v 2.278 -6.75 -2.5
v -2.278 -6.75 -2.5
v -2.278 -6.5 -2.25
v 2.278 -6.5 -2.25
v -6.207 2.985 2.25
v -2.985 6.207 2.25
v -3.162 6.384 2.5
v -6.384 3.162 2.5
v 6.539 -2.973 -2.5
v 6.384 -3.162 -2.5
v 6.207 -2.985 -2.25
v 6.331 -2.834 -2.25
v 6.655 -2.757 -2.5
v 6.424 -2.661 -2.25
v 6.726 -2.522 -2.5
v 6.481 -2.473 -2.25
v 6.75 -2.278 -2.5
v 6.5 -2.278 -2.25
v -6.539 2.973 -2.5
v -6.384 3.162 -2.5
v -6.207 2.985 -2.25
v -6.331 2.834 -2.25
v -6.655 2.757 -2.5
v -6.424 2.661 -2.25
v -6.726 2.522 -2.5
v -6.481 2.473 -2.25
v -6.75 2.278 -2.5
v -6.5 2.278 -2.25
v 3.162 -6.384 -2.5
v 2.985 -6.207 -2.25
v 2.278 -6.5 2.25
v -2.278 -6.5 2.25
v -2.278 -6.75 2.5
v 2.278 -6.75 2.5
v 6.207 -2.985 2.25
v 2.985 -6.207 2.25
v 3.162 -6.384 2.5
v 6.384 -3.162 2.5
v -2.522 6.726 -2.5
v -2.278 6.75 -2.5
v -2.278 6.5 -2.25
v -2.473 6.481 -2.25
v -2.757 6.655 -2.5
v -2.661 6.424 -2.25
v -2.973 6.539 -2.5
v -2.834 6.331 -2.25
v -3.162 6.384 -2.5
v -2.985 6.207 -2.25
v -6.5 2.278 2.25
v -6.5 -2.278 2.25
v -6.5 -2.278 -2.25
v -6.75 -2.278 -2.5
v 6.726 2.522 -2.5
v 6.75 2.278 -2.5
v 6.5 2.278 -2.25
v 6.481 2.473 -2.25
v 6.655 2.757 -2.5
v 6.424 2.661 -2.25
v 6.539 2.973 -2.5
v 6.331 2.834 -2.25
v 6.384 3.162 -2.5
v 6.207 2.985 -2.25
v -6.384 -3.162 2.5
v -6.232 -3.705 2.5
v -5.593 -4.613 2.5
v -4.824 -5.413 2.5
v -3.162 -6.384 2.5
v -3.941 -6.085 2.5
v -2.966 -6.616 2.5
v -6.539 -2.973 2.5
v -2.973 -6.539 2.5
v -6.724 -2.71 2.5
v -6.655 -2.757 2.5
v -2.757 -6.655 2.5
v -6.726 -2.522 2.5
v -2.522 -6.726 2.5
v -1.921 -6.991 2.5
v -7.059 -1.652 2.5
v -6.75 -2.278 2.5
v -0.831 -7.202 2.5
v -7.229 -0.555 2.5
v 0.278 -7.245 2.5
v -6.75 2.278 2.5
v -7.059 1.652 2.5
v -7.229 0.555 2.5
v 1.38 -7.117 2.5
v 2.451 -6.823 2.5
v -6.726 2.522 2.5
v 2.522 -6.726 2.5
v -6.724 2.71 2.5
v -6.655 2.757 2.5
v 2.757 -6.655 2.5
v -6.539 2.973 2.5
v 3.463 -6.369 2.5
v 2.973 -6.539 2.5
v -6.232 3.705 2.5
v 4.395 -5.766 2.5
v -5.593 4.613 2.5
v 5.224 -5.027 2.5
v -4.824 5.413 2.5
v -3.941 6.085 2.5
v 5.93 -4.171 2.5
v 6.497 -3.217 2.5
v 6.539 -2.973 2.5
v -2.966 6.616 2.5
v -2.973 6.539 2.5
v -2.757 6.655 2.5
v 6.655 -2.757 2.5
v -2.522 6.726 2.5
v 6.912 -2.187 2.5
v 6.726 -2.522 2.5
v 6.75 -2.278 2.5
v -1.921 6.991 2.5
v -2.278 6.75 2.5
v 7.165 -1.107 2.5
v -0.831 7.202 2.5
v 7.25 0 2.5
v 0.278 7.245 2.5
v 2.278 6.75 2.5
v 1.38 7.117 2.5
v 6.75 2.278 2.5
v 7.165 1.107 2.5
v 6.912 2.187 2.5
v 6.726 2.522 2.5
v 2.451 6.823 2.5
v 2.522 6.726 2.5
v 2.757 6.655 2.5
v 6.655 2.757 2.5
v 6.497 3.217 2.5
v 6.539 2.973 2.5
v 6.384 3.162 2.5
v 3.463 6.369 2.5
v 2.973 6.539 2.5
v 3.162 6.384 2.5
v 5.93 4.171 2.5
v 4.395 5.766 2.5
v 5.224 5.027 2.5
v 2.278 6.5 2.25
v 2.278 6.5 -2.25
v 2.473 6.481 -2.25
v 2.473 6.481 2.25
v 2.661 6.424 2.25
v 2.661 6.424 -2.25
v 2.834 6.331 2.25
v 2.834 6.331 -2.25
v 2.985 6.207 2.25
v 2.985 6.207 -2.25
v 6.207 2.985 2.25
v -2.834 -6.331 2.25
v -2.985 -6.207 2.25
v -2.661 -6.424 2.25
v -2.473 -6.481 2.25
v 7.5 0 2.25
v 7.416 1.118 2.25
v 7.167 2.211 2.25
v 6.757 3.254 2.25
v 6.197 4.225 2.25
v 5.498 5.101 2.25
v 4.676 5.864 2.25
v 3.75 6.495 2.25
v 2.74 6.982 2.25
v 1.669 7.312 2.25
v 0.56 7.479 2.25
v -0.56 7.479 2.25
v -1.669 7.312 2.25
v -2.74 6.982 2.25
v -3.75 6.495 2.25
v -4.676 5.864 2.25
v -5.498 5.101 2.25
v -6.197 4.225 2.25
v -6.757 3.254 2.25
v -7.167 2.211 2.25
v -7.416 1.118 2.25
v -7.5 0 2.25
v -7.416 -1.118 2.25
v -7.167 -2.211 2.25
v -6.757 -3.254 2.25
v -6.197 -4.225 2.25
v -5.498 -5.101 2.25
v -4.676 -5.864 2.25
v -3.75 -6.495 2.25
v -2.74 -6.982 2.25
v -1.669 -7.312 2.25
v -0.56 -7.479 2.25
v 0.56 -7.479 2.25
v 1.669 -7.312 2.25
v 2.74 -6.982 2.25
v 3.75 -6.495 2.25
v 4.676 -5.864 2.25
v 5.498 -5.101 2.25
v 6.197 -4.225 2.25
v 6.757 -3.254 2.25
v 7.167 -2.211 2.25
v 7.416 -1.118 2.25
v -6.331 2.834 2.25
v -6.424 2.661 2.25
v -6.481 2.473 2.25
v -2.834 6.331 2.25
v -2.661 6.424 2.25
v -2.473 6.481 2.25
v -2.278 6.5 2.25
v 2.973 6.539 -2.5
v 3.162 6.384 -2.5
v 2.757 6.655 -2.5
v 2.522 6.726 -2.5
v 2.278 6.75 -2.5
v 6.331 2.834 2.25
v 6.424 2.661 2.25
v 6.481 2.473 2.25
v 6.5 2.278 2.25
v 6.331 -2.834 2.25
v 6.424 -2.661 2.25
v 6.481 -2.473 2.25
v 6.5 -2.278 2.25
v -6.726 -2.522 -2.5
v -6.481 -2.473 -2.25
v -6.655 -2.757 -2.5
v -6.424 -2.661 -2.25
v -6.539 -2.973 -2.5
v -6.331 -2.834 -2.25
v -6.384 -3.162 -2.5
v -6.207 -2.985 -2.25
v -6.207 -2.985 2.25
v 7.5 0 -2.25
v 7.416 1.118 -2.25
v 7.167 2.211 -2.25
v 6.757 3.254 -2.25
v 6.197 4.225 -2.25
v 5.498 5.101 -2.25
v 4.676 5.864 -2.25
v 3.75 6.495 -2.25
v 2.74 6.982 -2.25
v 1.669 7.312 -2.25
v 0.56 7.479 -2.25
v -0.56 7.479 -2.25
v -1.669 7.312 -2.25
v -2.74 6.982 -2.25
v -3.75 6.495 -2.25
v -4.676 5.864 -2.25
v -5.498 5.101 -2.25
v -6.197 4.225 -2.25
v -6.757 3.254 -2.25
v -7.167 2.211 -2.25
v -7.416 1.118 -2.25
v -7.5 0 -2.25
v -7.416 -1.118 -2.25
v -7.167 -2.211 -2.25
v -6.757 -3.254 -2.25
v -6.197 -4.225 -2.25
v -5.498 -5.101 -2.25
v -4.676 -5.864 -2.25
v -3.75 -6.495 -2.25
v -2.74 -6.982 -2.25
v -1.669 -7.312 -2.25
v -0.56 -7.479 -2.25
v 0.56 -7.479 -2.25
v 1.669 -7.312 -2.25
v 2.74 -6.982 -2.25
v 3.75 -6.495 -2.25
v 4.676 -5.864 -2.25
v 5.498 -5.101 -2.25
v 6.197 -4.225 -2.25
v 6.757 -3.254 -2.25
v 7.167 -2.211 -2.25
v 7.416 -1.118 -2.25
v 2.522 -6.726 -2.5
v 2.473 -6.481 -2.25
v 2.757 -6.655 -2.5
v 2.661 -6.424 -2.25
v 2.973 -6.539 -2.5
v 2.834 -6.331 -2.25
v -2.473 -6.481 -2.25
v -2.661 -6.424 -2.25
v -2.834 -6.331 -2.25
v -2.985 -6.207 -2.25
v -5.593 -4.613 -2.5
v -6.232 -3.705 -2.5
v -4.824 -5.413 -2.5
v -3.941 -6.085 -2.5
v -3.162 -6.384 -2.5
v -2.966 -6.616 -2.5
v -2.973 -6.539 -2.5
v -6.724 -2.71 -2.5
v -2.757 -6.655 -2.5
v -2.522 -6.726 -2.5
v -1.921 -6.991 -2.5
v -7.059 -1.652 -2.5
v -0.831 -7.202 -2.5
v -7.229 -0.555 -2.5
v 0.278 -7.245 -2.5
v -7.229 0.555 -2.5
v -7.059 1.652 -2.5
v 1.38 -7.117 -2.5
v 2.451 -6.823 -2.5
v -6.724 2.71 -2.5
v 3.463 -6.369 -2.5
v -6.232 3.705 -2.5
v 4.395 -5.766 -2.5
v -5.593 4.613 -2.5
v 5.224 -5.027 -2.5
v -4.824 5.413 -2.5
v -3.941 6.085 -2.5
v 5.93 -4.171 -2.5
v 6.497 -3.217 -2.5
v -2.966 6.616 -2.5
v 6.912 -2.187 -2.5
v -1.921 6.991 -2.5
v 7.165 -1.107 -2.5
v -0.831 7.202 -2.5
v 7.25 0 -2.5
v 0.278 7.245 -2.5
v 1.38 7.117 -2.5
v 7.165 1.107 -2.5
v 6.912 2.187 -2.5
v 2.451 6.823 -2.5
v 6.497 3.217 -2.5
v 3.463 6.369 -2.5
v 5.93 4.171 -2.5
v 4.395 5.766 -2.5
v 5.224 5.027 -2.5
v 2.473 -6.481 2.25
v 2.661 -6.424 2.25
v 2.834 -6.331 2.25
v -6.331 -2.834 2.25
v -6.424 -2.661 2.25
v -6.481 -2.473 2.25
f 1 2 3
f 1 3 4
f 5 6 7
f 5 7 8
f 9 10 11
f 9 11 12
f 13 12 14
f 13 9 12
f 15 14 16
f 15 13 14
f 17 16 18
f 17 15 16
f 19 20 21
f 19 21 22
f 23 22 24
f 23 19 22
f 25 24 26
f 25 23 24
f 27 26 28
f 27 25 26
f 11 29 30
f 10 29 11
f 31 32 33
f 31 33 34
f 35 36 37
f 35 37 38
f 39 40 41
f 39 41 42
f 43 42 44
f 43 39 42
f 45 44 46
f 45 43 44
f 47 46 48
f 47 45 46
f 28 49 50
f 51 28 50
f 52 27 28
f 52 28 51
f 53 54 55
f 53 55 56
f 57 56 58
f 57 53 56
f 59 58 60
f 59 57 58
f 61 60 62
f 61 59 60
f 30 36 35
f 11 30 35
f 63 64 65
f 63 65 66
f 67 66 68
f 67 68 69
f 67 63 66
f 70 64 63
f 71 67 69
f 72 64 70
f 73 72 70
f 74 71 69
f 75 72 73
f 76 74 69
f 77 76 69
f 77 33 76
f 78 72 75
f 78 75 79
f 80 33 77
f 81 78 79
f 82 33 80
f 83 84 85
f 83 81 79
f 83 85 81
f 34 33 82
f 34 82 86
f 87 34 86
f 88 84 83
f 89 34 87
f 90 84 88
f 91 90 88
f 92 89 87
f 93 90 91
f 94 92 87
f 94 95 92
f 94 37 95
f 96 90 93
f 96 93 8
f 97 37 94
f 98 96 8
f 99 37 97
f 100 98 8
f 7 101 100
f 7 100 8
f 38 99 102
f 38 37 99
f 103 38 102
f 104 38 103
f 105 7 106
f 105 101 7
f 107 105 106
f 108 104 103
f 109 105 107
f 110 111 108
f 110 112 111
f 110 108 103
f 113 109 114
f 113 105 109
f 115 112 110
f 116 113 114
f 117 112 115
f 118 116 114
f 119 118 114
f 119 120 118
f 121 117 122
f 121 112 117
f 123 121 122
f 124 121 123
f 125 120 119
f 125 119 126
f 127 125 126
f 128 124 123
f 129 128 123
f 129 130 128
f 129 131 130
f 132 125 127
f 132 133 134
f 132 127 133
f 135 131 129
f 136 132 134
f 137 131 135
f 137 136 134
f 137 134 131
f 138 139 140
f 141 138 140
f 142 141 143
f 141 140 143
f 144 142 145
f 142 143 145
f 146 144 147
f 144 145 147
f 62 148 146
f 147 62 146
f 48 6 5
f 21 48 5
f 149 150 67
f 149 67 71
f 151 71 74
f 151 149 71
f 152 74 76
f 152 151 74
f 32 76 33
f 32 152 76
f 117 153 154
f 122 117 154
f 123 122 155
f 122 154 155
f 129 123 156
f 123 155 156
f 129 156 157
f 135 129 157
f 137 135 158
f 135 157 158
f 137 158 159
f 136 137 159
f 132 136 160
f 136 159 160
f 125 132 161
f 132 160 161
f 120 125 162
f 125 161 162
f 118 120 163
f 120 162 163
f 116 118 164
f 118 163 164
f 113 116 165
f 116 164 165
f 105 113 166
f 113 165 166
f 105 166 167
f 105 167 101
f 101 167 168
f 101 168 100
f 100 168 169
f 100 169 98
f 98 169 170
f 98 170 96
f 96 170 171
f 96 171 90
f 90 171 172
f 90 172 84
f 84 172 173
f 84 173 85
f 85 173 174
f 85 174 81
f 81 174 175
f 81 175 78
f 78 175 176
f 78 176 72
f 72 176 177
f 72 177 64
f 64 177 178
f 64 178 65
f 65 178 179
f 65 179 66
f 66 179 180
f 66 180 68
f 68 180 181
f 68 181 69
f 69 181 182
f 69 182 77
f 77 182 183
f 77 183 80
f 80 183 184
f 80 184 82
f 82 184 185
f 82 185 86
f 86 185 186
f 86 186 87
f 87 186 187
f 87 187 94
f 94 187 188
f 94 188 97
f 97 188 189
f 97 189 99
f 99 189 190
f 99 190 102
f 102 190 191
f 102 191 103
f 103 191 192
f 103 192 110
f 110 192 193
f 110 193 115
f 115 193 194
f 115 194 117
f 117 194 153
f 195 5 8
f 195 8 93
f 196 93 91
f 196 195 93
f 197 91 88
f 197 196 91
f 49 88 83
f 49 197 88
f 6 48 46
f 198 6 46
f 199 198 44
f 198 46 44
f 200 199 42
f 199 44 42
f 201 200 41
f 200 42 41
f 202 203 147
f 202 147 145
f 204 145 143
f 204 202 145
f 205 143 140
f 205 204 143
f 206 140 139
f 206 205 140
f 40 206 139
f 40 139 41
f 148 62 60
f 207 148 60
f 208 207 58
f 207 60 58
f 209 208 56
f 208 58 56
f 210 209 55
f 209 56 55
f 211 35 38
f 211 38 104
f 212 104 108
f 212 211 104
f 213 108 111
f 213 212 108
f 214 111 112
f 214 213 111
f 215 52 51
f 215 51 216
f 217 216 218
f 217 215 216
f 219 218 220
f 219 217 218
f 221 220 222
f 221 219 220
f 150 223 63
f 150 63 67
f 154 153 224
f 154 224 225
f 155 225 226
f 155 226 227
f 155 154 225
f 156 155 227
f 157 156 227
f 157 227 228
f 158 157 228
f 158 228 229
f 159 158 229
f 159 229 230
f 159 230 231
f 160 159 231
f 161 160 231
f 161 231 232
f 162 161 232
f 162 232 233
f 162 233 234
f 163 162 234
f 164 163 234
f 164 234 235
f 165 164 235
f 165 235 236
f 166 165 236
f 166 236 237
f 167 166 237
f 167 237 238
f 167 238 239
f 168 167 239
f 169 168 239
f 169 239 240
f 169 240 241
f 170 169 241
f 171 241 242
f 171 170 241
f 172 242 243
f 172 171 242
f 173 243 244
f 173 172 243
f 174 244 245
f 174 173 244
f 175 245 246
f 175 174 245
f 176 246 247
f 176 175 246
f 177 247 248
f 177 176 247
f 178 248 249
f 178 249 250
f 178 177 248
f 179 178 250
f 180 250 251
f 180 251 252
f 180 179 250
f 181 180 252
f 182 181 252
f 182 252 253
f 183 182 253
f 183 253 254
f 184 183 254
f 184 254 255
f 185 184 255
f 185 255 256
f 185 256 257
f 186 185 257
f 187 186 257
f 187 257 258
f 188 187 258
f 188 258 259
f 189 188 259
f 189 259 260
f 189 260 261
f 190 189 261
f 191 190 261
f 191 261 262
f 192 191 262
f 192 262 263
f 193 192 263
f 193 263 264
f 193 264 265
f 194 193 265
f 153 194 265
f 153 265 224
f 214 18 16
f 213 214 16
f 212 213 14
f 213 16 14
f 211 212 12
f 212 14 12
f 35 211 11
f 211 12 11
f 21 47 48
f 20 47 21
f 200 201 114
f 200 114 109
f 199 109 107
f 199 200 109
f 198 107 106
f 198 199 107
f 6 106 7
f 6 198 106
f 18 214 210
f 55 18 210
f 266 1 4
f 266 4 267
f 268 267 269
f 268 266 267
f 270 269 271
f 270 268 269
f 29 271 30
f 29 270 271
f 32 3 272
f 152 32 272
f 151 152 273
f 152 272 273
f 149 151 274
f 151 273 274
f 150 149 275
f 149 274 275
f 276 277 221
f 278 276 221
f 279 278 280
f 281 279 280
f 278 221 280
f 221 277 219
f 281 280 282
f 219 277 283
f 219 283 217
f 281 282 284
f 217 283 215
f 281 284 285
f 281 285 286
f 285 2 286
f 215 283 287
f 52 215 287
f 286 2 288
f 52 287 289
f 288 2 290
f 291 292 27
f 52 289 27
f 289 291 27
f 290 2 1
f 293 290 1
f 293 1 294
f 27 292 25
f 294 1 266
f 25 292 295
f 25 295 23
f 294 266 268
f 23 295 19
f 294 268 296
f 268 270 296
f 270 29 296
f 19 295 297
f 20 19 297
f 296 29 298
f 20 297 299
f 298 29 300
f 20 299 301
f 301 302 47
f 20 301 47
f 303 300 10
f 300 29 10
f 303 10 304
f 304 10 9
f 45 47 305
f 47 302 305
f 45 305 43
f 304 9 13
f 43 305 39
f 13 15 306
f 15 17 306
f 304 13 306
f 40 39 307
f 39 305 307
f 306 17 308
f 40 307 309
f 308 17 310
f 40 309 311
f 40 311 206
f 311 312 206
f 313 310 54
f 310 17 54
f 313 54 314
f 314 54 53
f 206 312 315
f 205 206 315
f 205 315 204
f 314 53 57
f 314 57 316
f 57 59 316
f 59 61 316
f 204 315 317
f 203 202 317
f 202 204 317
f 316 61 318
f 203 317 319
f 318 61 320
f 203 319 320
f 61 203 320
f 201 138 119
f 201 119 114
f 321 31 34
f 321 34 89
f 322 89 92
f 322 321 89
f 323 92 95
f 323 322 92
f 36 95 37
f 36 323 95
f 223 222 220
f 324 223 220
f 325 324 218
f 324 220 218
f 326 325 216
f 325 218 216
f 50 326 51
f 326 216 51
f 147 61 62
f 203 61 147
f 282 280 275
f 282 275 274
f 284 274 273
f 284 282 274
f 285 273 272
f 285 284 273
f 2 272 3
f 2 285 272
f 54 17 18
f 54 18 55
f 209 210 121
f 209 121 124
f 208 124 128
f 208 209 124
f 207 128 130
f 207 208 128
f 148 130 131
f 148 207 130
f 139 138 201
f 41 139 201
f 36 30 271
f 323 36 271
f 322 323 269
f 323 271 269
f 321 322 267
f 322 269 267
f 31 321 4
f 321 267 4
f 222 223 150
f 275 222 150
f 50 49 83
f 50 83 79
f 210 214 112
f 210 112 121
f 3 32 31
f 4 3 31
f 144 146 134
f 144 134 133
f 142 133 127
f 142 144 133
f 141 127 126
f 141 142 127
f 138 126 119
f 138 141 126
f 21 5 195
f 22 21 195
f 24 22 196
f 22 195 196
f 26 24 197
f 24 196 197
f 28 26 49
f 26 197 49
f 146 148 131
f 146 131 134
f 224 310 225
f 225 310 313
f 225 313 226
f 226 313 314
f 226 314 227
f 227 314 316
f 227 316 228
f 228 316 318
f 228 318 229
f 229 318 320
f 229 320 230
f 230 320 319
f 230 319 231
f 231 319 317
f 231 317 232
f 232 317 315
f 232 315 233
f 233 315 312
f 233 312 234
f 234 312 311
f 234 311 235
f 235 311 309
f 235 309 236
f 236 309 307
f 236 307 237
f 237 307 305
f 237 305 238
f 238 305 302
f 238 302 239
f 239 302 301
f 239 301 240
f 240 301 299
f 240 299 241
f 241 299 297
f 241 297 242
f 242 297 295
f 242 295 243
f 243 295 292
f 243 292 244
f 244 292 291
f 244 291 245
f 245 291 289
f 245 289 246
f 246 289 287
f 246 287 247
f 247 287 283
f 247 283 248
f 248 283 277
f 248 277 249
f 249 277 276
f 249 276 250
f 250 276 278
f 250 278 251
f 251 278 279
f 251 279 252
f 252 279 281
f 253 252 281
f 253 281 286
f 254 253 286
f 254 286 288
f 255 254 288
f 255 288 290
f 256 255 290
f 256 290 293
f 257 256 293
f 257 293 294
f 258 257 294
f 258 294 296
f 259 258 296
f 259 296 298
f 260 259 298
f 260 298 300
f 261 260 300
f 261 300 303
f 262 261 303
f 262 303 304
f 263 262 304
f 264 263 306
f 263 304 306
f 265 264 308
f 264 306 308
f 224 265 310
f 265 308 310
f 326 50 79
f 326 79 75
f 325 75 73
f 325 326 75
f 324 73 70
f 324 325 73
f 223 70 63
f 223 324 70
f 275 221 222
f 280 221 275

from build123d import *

# Parameters (mm, degrees)
SKETCH1_R           = 7.5
BOSS_EXTRUDE1_DEPTH = 2.5
FILLET1_R           = 1
CHAMFER1_SIZE       = 0.25


with BuildPart() as part:
    # Sketch1 → Boss-Extrude1 (new, symmetric)
    with BuildSketch(Plane.XY):
        Circle(SKETCH1_R)
        Polygon((-6.5, 2.692388155), (-6.5, -2.692388155), (-2.692388155, -6.5), (2.692388155, -6.5), (6.5, -2.692388155), (6.5, 2.692388155), (2.692388155, 6.5), (-2.692388155, 6.5), align=None, mode=Mode.SUBTRACT)
    extrude(amount=BOSS_EXTRUDE1_DEPTH, both=True)

    # Fillet1
    fillet1_edges = [part.edges().sort_by_distance(p)[0] for p in [
        (-6.5, -2.692388155, 0),
        (-6.5, 2.692388155, 0),
        (-2.692388155, -6.5, 0),
        (2.692388155, -6.5, 0),
        (6.5, -2.692388155, 0),
        (6.5, 2.692388155, 0),
        (2.692388155, 6.5, 0),
        (-2.692388155, 6.5, 0),
    ]]
    fillet(fillet1_edges, radius=FILLET1_R)

    # Chamfer1
    chamfer1_edges = [part.edges().sort_by_distance(p)[0] for p in [
        (-4.596194078, 4.596194078, 2.5),
        (-2.660858025, 6.423879533, 2.5),
        (-6.423879533, 2.660858025, 2.5),
        (0, 6.5, 2.5),
        (-6.5, 0, 2.5),
        (2.660858025, 6.423879533, 2.5),
        (-6.423879533, -2.660858025, 2.5),
        (4.596194078, 4.596194078, 2.5),
        (-4.596194078, -4.596194078, 2.5),
        (6.423879533, 2.660858025, 2.5),
        (-2.660858025, -6.423879533, 2.5),
        (6.5, 0, 2.5),
        (0, -6.5, 2.5),
        (6.423879533, -2.660858025, 2.5),
        (2.660858025, -6.423879533, 2.5),
        (4.596194078, -4.596194078, 2.5),
        (-7.5, 0, 2.5),
        (-4.596194078, 4.596194078, -2.5),
        (-2.660858025, 6.423879533, -2.5),
        (-6.423879533, 2.660858025, -2.5),
        (0, 6.5, -2.5),
        (-6.5, 0, -2.5),
        (2.660858025, 6.423879533, -2.5),
        (-6.423879533, -2.660858025, -2.5),
        (4.596194078, 4.596194078, -2.5),
        (-4.596194078, -4.596194078, -2.5),
        (6.423879533, 2.660858025, -2.5),
        (-2.660858025, -6.423879533, -2.5),
        (6.5, 0, -2.5),
        (0, -6.5, -2.5),
        (6.423879533, -2.660858025, -2.5),
        (2.660858025, -6.423879533, -2.5),
        (4.596194078, -4.596194078, -2.5),
        (-7.5, 0, -2.5),
    ]]
    chamfer(chamfer1_edges, length=CHAMFER1_SIZE)


solid = part.part
